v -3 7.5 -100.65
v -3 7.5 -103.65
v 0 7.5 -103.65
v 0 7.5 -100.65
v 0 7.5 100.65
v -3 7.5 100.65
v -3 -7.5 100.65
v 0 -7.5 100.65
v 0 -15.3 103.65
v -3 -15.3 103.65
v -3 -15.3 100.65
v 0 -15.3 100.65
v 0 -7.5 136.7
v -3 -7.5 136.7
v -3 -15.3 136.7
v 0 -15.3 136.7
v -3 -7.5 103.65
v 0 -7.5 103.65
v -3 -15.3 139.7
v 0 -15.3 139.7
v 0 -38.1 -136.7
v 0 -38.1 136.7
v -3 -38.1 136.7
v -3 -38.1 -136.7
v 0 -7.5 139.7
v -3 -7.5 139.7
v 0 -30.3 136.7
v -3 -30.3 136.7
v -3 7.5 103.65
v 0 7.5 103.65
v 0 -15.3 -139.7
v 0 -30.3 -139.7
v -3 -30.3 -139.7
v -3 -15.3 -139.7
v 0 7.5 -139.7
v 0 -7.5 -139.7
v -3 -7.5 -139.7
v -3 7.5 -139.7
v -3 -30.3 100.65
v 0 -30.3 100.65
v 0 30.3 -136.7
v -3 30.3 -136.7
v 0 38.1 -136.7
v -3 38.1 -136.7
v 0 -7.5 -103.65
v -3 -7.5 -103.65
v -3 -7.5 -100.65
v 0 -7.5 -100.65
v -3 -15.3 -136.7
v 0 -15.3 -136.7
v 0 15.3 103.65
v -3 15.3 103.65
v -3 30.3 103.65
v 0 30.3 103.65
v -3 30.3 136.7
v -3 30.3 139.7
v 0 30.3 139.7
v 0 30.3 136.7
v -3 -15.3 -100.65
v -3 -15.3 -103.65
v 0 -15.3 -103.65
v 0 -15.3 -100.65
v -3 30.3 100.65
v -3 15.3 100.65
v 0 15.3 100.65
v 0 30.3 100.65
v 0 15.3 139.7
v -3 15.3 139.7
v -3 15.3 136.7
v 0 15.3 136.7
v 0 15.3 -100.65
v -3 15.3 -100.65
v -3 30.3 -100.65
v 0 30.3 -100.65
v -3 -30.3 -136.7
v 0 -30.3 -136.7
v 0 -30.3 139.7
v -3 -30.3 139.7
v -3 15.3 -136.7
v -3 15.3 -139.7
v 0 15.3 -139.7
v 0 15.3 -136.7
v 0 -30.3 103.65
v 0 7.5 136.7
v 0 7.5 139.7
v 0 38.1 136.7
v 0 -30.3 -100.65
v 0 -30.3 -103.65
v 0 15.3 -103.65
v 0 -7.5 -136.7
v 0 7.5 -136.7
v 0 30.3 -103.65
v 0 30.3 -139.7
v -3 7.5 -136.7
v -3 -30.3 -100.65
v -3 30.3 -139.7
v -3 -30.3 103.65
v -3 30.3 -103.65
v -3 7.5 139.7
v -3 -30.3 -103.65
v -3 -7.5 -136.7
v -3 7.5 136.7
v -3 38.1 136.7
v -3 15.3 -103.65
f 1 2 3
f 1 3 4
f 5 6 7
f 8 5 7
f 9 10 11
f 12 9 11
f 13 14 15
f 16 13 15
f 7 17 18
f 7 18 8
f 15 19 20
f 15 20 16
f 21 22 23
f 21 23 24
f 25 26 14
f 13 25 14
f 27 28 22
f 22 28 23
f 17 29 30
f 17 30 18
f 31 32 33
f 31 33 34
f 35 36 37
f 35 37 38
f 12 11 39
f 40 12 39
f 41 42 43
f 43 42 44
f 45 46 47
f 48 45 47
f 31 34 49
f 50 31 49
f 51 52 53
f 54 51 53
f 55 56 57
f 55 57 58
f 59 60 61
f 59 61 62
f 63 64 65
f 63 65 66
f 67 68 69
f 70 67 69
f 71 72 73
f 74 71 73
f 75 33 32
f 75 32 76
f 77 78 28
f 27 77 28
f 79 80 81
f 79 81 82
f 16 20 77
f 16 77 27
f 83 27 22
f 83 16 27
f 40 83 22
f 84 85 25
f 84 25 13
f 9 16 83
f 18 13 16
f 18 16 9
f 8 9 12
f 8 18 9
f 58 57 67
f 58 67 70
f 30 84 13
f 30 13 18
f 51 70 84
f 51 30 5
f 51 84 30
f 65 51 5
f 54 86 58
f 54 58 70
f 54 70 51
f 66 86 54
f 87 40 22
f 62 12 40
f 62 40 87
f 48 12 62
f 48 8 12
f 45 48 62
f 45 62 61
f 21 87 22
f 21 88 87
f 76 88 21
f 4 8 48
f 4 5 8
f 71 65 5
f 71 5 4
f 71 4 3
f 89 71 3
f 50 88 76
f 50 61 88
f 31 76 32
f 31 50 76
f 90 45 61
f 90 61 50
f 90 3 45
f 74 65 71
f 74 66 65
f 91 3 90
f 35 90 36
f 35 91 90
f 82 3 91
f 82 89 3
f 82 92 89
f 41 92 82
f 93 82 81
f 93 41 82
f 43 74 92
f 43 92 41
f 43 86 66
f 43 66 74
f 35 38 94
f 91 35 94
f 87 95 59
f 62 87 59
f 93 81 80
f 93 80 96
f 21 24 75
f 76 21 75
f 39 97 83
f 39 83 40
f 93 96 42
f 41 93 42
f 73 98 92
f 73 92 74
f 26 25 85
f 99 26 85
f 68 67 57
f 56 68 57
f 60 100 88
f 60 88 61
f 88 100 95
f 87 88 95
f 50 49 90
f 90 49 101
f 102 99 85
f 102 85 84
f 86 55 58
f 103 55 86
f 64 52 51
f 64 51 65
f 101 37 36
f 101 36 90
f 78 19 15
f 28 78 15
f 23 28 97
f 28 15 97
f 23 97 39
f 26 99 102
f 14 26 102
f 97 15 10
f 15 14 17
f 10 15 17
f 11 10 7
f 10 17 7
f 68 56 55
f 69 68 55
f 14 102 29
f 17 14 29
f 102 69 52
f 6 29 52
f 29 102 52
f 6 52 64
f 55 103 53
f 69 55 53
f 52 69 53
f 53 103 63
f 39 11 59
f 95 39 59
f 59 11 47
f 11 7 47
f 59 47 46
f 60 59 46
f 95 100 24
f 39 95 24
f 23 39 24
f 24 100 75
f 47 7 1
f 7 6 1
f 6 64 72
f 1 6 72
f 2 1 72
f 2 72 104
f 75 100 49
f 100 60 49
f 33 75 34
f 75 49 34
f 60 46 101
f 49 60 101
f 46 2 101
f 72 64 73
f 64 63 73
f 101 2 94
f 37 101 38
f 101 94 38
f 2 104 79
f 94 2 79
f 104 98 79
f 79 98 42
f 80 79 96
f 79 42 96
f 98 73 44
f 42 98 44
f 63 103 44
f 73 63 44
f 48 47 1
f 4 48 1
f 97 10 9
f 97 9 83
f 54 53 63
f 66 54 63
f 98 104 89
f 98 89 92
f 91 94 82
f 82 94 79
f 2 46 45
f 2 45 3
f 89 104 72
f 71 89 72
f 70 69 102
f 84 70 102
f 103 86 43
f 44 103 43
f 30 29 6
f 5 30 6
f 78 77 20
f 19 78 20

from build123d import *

# Parameters (mm, degrees)
SKETCH1_W                 = 279.4
SKETCH1_H                 = 76.2
BOSS_EXTRUDE1_DEPTH       = 3
SKETCH3_W                 = 3
SKETCH3_H                 = 15
SKETCH3_H_2               = 7.8
CUT_EXTRUDE1_DEPTH        = 145.833352512
LPATTERN1_COUNT           = 4
LPATTERN1_PITCH           = 22.8
MIRROR1_COPY_1_SKETCH_W   = 3
MIRROR1_COPY_1_SKETCH_H   = 15
MIRROR1_COPY_1_SKETCH_H_2 = 7.8
MIRROR1_COPY_1_DEPTH      = 145.833352512
MIRROR1_COPY_2_SKETCH_W   = 3
MIRROR1_COPY_2_SKETCH_H   = 15
MIRROR1_COPY_2_SKETCH_H_2 = 7.8
MIRROR1_COPY_2_DEPTH      = 145.833352512
MIRROR1_COPY_3_SKETCH_W   = 3
MIRROR1_COPY_3_SKETCH_H   = 15
MIRROR1_COPY_3_SKETCH_H_2 = 7.8
MIRROR1_COPY_3_DEPTH      = 145.833352512


with BuildPart() as part:
    # Sketch1 → Boss-Extrude1 (new body)
    with BuildSketch(Plane(origin=(0, 0, 0), x_dir=(0, 0, -1), z_dir=(1, 0, 0))):
        Rectangle(SKETCH1_W, SKETCH1_H)
    extrude(amount=-BOSS_EXTRUDE1_DEPTH)

    # Sketch3 → Cut-Extrude1 (cut, through all)
    with BuildSketch(Plane.ZY.offset(3)):
        with Locations((-102.15, 22.8)):
            Rectangle(SKETCH3_W, SKETCH3_H)
        with Locations((-138.2, 34.2)):
            Rectangle(SKETCH3_W, SKETCH3_H_2)
    cut_extrude1 = extrude(amount=-CUT_EXTRUDE1_DEPTH, mode=Mode.SUBTRACT)

    # LPattern1: Cut-Extrude1 ×4
    with Locations(*[(0, -i * LPATTERN1_PITCH, 0) for i in range(1, LPATTERN1_COUNT)]):
        add(cut_extrude1, mode=Mode.SUBTRACT)

    # Mirror1: Cut-Extrude1 across plane
    add(cut_extrude1.mirror(Plane.XY), mode=Mode.SUBTRACT)

    # Mirror1 copy 1 sketch → Mirror1 copy 1 (cut, through all)
    with BuildSketch(Plane(origin=(-3, -22.8, 0), x_dir=(0, 0, -1), z_dir=(-1, 0, 0))):
        with Locations((-102.15, -22.8)):
            Rectangle(MIRROR1_COPY_1_SKETCH_W, MIRROR1_COPY_1_SKETCH_H)
        with Locations((-138.2, -34.2)):
            Rectangle(MIRROR1_COPY_1_SKETCH_W, MIRROR1_COPY_1_SKETCH_H_2)
    extrude(amount=-MIRROR1_COPY_1_DEPTH, mode=Mode.SUBTRACT)

    # Mirror1 copy 2 sketch → Mirror1 copy 2 (cut, through all)
    with BuildSketch(Plane(origin=(-3, -45.6, 0), x_dir=(0, 0, -1), z_dir=(-1, 0, 0))):
        with Locations((-102.15, -22.8)):
            Rectangle(MIRROR1_COPY_2_SKETCH_W, MIRROR1_COPY_2_SKETCH_H)
        with Locations((-138.2, -34.2)):
            Rectangle(MIRROR1_COPY_2_SKETCH_W, MIRROR1_COPY_2_SKETCH_H_2)
    extrude(amount=-MIRROR1_COPY_2_DEPTH, mode=Mode.SUBTRACT)

    # Mirror1 copy 3 sketch → Mirror1 copy 3 (cut, through all)
    with BuildSketch(Plane(origin=(-3, -68.4, 0), x_dir=(0, 0, -1), z_dir=(-1, 0, 0))):
        with Locations((-102.15, -22.8)):
            Rectangle(MIRROR1_COPY_3_SKETCH_W, MIRROR1_COPY_3_SKETCH_H)
        with Locations((-138.2, -34.2)):
            Rectangle(MIRROR1_COPY_3_SKETCH_W, MIRROR1_COPY_3_SKETCH_H_2)
    extrude(amount=-MIRROR1_COPY_3_DEPTH, mode=Mode.SUBTRACT)


solid = part.part
